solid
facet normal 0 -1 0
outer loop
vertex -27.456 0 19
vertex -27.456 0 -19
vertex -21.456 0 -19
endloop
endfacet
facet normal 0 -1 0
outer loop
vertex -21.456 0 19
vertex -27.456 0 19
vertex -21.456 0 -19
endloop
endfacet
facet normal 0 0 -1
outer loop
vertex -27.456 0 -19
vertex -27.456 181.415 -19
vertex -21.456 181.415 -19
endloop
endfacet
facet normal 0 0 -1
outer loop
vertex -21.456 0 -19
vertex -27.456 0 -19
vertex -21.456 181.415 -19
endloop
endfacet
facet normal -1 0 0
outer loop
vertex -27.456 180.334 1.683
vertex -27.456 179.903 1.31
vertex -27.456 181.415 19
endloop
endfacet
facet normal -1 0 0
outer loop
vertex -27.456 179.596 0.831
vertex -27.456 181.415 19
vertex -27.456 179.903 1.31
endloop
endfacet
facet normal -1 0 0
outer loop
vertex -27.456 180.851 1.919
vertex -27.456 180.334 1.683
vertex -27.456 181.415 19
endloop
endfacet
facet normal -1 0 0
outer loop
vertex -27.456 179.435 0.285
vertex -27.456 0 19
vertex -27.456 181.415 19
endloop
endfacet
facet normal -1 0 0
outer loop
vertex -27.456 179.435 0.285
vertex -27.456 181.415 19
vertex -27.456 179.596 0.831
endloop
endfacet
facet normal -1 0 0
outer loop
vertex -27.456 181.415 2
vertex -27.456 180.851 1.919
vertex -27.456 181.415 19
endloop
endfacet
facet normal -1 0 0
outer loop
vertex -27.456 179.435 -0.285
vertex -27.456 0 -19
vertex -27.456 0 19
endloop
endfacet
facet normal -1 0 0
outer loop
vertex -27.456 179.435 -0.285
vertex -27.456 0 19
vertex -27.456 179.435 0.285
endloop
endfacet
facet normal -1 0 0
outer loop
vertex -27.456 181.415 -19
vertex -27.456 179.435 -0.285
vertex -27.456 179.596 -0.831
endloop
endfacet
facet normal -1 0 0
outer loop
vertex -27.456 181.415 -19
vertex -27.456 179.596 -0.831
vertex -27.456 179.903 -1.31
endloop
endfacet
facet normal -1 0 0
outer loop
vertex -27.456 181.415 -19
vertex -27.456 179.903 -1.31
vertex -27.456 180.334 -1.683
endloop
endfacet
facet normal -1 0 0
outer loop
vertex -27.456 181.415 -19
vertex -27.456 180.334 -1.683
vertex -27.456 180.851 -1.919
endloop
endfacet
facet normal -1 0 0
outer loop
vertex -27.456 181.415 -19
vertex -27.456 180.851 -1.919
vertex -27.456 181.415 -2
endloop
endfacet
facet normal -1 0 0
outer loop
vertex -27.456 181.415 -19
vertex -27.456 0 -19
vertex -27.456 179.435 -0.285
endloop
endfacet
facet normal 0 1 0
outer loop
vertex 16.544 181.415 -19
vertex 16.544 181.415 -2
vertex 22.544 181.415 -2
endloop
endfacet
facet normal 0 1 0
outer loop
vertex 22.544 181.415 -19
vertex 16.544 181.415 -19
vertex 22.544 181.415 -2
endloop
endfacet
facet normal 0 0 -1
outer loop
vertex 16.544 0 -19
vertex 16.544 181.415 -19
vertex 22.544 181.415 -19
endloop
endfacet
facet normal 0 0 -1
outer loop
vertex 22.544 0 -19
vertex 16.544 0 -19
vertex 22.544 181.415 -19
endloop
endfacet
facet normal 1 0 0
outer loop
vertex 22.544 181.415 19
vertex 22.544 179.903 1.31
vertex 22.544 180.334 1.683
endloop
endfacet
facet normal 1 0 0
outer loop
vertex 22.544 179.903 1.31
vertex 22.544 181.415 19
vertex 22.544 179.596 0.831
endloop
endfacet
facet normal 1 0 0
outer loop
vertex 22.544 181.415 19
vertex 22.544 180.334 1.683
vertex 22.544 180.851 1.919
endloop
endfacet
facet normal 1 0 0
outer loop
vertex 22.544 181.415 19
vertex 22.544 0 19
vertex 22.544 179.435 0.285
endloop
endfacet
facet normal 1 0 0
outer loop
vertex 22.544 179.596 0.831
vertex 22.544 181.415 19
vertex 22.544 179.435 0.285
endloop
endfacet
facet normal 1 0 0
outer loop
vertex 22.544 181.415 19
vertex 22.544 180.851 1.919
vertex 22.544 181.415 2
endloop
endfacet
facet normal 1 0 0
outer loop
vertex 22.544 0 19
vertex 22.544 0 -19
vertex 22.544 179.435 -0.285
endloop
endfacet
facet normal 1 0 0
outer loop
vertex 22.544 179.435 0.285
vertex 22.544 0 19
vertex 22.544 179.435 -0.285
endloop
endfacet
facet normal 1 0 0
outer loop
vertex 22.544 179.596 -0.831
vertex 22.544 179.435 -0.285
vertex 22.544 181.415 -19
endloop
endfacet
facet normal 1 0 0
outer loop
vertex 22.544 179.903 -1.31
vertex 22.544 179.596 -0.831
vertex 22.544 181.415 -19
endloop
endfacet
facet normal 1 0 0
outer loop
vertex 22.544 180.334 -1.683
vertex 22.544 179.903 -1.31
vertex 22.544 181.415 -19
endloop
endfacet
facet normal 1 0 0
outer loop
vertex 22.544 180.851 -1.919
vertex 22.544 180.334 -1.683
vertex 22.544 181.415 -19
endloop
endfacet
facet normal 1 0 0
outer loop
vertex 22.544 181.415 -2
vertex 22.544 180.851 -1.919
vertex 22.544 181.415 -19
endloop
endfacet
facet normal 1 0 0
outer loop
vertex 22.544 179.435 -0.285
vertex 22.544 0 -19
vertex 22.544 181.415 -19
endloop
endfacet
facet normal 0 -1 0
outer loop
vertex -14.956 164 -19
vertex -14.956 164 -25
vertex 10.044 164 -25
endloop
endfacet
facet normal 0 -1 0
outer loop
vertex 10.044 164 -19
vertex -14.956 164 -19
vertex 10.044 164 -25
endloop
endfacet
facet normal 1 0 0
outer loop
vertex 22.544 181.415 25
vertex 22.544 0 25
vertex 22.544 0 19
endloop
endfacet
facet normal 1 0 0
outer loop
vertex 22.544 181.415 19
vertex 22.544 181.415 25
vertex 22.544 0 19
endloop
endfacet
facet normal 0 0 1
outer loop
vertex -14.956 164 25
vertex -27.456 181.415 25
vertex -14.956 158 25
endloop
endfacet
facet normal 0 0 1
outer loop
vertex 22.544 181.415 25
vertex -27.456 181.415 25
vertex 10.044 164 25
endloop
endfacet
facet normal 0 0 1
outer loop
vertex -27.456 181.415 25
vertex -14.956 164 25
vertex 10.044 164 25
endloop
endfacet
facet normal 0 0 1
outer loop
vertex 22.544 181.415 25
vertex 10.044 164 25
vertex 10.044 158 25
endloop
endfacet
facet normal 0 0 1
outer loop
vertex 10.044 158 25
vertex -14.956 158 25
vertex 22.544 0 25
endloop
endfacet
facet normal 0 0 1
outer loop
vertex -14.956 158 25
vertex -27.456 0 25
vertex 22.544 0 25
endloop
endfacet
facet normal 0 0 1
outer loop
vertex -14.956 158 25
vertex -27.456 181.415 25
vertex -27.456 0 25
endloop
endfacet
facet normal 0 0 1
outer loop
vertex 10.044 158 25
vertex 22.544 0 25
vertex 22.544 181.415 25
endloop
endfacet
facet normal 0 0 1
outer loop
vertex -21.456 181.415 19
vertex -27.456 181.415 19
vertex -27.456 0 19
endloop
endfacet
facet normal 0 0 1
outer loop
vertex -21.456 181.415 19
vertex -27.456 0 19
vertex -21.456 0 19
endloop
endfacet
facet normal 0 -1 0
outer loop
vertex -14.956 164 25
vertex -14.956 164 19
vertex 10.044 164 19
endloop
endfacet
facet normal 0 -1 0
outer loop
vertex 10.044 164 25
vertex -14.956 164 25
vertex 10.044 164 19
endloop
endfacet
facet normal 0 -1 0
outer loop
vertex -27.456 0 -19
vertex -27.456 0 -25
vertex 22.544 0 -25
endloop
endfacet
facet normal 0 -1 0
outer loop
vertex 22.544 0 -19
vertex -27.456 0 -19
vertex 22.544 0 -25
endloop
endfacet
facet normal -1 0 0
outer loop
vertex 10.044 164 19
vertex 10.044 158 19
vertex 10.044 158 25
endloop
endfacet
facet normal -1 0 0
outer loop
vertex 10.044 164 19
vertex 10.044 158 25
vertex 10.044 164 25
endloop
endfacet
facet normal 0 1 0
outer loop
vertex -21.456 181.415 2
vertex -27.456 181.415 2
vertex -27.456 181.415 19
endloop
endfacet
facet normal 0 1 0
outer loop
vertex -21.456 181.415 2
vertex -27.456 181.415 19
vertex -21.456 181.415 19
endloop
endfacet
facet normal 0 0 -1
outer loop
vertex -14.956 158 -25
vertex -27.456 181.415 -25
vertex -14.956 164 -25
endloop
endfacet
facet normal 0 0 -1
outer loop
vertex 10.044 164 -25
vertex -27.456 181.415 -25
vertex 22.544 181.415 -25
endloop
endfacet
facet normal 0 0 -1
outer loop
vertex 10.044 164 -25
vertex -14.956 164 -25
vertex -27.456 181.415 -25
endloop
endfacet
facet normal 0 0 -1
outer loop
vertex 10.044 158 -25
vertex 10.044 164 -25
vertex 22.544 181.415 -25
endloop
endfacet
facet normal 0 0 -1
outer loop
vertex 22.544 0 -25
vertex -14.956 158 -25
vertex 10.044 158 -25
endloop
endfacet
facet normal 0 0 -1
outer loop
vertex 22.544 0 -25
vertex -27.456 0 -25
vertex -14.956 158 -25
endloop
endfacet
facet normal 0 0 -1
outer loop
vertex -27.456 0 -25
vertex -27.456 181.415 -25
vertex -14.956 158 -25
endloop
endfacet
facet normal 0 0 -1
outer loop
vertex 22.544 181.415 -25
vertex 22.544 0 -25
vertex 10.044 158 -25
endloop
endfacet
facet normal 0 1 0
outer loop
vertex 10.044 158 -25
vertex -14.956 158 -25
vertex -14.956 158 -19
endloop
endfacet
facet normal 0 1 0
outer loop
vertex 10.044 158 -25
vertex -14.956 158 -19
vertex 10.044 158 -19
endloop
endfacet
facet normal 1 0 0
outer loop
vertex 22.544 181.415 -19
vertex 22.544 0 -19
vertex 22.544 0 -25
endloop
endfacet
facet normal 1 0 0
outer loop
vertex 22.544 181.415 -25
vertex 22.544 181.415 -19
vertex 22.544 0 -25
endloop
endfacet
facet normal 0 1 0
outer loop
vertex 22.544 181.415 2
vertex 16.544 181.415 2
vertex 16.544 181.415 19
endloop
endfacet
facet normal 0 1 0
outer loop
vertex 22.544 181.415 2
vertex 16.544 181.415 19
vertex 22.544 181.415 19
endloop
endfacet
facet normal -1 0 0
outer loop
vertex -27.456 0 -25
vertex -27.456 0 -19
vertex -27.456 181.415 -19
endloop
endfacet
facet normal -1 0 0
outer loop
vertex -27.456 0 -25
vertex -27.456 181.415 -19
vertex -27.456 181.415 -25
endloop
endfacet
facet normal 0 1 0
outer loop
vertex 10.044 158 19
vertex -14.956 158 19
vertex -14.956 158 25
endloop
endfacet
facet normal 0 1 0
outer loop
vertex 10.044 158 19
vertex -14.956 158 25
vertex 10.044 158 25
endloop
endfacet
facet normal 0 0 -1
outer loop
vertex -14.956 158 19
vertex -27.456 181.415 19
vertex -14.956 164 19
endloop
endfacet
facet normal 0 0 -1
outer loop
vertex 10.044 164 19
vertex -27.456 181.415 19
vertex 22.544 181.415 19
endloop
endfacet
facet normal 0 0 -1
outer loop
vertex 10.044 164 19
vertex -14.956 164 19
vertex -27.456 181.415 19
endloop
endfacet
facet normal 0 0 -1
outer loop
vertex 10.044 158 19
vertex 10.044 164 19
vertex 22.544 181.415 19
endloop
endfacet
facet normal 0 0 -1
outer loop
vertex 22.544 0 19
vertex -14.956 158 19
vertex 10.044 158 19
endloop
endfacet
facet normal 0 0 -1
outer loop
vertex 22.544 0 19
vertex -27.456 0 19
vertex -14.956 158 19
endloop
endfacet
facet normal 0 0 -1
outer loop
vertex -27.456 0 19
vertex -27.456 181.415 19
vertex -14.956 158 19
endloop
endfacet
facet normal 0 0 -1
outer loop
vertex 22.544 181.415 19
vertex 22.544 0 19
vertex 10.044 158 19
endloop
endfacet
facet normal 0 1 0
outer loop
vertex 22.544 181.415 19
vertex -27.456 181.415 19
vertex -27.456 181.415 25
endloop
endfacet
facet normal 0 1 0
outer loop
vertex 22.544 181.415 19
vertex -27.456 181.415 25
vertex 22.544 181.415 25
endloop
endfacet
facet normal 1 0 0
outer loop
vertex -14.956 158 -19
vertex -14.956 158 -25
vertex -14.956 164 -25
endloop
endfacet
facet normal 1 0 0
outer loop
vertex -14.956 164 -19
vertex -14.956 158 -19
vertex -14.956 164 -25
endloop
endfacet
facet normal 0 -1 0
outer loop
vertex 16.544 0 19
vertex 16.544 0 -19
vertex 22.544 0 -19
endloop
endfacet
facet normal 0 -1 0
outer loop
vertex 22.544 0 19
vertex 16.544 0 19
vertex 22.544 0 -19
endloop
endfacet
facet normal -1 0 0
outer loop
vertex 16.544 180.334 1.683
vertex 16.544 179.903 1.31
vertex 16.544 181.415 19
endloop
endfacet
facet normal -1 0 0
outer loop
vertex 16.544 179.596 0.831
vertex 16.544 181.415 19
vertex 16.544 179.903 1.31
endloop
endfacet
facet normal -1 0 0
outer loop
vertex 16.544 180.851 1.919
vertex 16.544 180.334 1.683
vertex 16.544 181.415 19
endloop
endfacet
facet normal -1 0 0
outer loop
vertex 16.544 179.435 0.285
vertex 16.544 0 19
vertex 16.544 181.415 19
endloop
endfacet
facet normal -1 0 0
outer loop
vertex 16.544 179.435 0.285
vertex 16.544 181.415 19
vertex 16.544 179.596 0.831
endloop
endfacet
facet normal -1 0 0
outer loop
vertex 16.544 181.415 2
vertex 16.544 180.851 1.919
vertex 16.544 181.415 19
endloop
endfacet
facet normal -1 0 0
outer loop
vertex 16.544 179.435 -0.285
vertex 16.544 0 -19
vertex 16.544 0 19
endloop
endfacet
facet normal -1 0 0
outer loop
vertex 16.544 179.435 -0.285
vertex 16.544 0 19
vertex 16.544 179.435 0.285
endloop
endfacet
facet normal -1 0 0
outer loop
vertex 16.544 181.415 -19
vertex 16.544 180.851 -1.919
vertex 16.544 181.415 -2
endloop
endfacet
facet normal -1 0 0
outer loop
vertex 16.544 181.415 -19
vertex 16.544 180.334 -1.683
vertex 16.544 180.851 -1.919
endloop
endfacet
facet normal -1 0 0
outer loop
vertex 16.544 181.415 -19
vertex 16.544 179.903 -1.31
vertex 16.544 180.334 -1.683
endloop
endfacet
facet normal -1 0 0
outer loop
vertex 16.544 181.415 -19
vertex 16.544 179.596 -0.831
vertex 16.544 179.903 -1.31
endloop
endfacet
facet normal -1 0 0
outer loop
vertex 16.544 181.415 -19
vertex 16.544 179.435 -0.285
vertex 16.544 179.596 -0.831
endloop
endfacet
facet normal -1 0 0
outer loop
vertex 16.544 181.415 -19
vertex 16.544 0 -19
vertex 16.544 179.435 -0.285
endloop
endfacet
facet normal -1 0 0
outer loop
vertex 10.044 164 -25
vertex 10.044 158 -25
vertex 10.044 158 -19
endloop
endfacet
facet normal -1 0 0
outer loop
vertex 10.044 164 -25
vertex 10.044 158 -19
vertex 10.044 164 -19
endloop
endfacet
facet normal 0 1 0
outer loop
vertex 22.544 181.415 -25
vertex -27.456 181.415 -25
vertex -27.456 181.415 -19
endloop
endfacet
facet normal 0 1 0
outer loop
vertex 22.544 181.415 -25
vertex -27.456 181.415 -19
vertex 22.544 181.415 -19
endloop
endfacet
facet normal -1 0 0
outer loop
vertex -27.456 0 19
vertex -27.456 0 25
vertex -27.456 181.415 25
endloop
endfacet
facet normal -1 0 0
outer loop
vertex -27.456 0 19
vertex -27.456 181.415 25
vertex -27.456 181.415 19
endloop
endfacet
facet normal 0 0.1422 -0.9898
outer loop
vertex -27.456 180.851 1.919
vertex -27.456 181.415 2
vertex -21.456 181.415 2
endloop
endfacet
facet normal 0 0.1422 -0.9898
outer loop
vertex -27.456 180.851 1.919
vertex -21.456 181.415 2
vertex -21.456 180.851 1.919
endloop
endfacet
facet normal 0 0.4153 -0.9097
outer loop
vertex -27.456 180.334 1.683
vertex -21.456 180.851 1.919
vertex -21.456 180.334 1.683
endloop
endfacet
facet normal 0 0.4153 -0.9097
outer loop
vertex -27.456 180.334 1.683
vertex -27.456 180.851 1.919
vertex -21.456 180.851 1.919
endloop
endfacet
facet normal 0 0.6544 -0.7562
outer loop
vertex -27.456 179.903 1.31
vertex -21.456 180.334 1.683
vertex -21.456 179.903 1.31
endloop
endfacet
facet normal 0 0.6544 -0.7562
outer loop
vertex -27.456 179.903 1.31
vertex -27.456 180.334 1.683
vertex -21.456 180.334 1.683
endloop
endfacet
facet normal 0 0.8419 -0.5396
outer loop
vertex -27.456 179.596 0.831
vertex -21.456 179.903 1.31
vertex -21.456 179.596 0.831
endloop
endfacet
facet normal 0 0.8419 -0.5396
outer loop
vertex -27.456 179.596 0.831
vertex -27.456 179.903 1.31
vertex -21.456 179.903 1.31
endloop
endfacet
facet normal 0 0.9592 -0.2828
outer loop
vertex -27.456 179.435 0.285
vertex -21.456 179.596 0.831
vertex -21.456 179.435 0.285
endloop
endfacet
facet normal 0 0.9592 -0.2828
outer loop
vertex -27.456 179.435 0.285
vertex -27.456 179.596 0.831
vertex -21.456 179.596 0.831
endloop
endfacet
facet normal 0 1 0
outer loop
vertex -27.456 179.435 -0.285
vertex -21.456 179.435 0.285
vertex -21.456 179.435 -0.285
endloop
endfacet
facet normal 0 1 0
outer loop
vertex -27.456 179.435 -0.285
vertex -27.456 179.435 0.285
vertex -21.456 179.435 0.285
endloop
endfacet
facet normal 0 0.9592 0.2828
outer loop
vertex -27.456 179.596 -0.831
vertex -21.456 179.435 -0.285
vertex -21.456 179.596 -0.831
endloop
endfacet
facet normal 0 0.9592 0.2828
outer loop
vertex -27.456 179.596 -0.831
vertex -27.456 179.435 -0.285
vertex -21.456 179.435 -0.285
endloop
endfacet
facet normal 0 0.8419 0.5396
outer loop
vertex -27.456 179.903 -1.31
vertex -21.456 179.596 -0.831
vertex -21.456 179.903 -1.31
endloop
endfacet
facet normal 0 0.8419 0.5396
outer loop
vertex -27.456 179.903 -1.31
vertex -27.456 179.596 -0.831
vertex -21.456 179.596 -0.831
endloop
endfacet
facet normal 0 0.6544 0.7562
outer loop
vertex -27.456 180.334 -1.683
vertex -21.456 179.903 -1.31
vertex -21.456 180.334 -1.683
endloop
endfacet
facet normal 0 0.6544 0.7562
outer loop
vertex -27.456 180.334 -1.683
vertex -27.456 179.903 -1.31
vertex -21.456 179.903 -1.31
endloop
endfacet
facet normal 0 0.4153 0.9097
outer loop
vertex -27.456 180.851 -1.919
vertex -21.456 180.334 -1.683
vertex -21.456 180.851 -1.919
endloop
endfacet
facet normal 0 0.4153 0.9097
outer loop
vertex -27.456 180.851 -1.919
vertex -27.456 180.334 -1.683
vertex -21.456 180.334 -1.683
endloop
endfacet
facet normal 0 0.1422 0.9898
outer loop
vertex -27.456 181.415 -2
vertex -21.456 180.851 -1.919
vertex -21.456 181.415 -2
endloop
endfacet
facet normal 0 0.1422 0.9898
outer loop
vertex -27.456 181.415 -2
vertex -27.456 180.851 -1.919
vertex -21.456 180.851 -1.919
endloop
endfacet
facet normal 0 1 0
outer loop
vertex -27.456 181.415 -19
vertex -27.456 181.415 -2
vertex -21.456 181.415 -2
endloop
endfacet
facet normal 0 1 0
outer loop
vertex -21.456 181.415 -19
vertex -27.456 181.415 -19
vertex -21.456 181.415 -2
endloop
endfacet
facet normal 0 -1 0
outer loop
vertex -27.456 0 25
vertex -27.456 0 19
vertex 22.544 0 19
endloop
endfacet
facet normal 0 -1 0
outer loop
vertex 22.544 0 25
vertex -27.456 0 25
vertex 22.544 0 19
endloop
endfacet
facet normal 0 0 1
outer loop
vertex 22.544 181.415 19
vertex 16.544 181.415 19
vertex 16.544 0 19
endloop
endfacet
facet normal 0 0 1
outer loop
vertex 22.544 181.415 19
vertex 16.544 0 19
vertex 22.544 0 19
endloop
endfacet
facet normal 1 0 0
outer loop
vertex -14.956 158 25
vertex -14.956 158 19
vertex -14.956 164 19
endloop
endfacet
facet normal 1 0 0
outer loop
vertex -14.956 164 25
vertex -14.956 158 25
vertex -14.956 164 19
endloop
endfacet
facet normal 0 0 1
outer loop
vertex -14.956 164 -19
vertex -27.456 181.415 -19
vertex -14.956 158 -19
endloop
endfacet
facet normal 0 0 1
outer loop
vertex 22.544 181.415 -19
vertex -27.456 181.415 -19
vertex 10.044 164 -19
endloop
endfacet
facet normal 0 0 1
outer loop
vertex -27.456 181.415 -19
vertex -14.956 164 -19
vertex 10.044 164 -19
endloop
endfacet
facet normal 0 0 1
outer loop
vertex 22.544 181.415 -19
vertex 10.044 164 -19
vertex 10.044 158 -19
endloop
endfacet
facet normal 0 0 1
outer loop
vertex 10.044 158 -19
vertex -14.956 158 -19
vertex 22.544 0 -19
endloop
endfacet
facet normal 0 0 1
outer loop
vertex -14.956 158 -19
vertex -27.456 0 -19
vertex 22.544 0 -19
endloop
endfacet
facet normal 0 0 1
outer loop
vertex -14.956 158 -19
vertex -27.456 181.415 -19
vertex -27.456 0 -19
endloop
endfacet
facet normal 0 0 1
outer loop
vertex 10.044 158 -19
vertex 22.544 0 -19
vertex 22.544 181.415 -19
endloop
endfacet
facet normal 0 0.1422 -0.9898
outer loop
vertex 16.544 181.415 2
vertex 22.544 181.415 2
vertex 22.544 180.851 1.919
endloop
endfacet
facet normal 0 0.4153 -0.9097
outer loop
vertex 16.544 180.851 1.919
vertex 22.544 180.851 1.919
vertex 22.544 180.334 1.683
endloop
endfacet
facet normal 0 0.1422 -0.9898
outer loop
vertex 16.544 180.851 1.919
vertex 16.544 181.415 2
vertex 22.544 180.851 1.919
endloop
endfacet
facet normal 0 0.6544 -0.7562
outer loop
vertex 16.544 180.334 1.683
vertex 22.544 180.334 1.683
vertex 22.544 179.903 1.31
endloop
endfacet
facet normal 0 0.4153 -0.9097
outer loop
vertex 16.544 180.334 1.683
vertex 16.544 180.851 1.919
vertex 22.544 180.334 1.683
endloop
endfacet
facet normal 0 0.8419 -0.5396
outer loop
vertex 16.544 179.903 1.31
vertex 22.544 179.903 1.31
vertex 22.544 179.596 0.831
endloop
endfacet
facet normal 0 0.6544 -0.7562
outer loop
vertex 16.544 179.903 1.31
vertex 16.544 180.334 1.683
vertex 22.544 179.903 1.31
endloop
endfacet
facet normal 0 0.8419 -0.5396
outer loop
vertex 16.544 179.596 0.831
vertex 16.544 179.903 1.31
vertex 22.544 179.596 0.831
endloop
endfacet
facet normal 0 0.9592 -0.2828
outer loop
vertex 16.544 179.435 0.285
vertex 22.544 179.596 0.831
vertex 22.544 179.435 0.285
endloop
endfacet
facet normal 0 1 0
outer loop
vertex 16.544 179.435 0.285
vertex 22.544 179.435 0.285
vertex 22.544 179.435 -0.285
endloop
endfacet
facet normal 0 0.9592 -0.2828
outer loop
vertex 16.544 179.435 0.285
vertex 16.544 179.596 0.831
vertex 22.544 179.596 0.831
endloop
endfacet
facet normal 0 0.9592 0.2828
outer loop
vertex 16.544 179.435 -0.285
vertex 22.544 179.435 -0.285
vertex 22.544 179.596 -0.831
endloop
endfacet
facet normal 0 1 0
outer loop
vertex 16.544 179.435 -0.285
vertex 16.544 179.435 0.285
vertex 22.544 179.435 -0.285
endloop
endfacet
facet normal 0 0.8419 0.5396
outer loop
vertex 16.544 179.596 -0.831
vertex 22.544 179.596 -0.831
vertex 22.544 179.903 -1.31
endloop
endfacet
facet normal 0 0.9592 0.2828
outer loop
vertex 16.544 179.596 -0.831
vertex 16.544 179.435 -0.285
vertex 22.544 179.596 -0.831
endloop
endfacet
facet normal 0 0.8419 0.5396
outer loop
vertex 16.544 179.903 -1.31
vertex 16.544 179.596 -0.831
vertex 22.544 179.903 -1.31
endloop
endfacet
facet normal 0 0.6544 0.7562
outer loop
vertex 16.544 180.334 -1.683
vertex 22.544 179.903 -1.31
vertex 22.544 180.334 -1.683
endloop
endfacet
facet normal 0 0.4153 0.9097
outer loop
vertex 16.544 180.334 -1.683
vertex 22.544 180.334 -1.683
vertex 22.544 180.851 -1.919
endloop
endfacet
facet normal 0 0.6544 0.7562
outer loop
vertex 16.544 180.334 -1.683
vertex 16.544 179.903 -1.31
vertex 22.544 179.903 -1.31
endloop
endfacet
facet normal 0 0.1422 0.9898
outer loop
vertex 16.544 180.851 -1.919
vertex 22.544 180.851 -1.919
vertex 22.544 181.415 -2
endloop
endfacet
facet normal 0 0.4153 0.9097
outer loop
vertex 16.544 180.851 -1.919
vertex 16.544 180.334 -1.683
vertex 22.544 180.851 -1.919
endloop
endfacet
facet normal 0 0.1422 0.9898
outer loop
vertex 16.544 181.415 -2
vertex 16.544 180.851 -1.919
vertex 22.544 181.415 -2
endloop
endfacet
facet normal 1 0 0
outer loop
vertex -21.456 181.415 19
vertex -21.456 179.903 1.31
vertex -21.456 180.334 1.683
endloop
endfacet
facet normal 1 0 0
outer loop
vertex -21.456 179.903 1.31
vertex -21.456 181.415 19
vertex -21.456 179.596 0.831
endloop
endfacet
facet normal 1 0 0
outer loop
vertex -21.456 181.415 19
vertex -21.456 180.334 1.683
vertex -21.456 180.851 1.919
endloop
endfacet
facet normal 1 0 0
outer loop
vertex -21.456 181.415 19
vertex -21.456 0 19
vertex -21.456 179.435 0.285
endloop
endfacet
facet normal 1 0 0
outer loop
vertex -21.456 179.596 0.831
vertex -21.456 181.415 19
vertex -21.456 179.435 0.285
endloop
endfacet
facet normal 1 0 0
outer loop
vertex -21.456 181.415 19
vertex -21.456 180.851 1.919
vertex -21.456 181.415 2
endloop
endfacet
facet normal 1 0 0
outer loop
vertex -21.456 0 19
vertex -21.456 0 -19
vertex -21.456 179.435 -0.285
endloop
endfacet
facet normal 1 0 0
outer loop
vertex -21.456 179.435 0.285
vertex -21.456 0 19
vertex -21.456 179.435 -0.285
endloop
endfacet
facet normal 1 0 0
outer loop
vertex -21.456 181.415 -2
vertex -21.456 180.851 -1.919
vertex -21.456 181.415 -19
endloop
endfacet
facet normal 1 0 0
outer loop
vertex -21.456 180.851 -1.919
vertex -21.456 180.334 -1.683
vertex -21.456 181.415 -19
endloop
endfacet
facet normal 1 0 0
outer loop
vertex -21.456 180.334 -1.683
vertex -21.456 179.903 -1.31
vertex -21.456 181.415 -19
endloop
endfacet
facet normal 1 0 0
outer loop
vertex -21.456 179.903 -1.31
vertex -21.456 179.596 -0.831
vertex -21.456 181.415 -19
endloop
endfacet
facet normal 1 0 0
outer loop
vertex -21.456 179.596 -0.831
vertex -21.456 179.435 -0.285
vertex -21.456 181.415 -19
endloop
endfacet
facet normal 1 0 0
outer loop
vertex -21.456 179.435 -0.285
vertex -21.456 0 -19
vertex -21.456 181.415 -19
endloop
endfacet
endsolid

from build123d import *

# Parameters (mm, degrees)
ESBO_O1_W             = 50
ESBO_O1_H             = 6
PAREDE_1_DEPTH        = 181.4148
PAREDE_1_2_DEPTH      = 181.4148
ESBO_O4_W             = 6
ESBO_O4_H             = 181.4148
PAREDE_2_DEPTH        = 38
PAREDE_2_2_DEPTH      = 38
CORTE_TUBO_START      = -50
ESBO_O5_R             = 2
CORTE_TUBO_DEPTH      = 50
CORTE_EXTRUS_O1_START = -50
ESBO_O7_W             = 25
ESBO_O7_H             = 6
CORTE_EXTRUS_O1_DEPTH = 50


with BuildPart() as part:
    # Esboço1 → parede_1 (new body)
    with BuildSketch(Plane(origin=(0, 0, 0), x_dir=(1, 0, 0), z_dir=(0, 1, 0))):
        with Locations((-2.45569837, 22)):
            Rectangle(ESBO_O1_W, ESBO_O1_H)
    extrude(amount=PAREDE_1_DEPTH)


with BuildPart() as body_2:
    # Esboço1 → parede_1 2 (new body)
    with BuildSketch(Plane(origin=(0, 0, 0), x_dir=(1, 0, 0), z_dir=(0, 1, 0))):
        with Locations((-2.45569837, -22)):
            Rectangle(ESBO_O1_W, ESBO_O1_H)
    extrude(amount=PAREDE_1_2_DEPTH)


with BuildPart() as body_3:
    # Esboço4 → parede_2 (new body)
    with BuildSketch(Plane.XY.offset(-19)):
        with Locations((19.54430163, 90.7074)):
            Rectangle(ESBO_O4_W, ESBO_O4_H)
    extrude(amount=PAREDE_2_DEPTH)


with BuildPart() as body_4:
    # Esboço4 → parede_2 2 (new body)
    with BuildSketch(Plane.XY.offset(-19)):
        with Locations((-24.45569837, 90.7074)):
            Rectangle(ESBO_O4_W, ESBO_O4_H)
    extrude(amount=PAREDE_2_2_DEPTH)


with BuildPart() as corte_tubo_tool:
    # Esboço5 → Corte_tubo (new body)
    with BuildSketch(Plane(origin=(22.54430163, 0, 0), x_dir=(0, 0, -1), z_dir=(1, 0, 0)).offset(CORTE_TUBO_START)):
        with Locations((0, 181.4148)):
            Circle(ESBO_O5_R)
    extrude(amount=CORTE_TUBO_DEPTH)


with BuildPart() as body_3_1:
    add(body_3.part)

    # Corte_tubo: cut by corte_tubo_tool
    add(corte_tubo_tool.part, mode=Mode.SUBTRACT)


with BuildPart() as body_4_1:
    add(body_4.part)

    # Corte_tubo: cut by corte_tubo_tool
    add(corte_tubo_tool.part, mode=Mode.SUBTRACT)


with BuildPart() as corte_extrus_o1_tool:
    # Esboço7 → Corte-extrusão1 (new body)
    with BuildSketch(Plane.XY.offset(25).offset(CORTE_EXTRUS_O1_START)):
        with Locations((-2.45569837, 161)):
            Rectangle(ESBO_O7_W, ESBO_O7_H)
    extrude(amount=CORTE_EXTRUS_O1_DEPTH)


with BuildPart() as part_1:
    add(part.part)

    # Corte-extrusão1: cut by corte_extrus_o1_tool
    add(corte_extrus_o1_tool.part, mode=Mode.SUBTRACT)


with BuildPart() as body_2_1:
    add(body_2.part)

    # Corte-extrusão1: cut by corte_extrus_o1_tool
    add(corte_extrus_o1_tool.part, mode=Mode.SUBTRACT)


solid = Compound([body_3_1.part, body_4_1.part, part_1.part, body_2_1.part])
